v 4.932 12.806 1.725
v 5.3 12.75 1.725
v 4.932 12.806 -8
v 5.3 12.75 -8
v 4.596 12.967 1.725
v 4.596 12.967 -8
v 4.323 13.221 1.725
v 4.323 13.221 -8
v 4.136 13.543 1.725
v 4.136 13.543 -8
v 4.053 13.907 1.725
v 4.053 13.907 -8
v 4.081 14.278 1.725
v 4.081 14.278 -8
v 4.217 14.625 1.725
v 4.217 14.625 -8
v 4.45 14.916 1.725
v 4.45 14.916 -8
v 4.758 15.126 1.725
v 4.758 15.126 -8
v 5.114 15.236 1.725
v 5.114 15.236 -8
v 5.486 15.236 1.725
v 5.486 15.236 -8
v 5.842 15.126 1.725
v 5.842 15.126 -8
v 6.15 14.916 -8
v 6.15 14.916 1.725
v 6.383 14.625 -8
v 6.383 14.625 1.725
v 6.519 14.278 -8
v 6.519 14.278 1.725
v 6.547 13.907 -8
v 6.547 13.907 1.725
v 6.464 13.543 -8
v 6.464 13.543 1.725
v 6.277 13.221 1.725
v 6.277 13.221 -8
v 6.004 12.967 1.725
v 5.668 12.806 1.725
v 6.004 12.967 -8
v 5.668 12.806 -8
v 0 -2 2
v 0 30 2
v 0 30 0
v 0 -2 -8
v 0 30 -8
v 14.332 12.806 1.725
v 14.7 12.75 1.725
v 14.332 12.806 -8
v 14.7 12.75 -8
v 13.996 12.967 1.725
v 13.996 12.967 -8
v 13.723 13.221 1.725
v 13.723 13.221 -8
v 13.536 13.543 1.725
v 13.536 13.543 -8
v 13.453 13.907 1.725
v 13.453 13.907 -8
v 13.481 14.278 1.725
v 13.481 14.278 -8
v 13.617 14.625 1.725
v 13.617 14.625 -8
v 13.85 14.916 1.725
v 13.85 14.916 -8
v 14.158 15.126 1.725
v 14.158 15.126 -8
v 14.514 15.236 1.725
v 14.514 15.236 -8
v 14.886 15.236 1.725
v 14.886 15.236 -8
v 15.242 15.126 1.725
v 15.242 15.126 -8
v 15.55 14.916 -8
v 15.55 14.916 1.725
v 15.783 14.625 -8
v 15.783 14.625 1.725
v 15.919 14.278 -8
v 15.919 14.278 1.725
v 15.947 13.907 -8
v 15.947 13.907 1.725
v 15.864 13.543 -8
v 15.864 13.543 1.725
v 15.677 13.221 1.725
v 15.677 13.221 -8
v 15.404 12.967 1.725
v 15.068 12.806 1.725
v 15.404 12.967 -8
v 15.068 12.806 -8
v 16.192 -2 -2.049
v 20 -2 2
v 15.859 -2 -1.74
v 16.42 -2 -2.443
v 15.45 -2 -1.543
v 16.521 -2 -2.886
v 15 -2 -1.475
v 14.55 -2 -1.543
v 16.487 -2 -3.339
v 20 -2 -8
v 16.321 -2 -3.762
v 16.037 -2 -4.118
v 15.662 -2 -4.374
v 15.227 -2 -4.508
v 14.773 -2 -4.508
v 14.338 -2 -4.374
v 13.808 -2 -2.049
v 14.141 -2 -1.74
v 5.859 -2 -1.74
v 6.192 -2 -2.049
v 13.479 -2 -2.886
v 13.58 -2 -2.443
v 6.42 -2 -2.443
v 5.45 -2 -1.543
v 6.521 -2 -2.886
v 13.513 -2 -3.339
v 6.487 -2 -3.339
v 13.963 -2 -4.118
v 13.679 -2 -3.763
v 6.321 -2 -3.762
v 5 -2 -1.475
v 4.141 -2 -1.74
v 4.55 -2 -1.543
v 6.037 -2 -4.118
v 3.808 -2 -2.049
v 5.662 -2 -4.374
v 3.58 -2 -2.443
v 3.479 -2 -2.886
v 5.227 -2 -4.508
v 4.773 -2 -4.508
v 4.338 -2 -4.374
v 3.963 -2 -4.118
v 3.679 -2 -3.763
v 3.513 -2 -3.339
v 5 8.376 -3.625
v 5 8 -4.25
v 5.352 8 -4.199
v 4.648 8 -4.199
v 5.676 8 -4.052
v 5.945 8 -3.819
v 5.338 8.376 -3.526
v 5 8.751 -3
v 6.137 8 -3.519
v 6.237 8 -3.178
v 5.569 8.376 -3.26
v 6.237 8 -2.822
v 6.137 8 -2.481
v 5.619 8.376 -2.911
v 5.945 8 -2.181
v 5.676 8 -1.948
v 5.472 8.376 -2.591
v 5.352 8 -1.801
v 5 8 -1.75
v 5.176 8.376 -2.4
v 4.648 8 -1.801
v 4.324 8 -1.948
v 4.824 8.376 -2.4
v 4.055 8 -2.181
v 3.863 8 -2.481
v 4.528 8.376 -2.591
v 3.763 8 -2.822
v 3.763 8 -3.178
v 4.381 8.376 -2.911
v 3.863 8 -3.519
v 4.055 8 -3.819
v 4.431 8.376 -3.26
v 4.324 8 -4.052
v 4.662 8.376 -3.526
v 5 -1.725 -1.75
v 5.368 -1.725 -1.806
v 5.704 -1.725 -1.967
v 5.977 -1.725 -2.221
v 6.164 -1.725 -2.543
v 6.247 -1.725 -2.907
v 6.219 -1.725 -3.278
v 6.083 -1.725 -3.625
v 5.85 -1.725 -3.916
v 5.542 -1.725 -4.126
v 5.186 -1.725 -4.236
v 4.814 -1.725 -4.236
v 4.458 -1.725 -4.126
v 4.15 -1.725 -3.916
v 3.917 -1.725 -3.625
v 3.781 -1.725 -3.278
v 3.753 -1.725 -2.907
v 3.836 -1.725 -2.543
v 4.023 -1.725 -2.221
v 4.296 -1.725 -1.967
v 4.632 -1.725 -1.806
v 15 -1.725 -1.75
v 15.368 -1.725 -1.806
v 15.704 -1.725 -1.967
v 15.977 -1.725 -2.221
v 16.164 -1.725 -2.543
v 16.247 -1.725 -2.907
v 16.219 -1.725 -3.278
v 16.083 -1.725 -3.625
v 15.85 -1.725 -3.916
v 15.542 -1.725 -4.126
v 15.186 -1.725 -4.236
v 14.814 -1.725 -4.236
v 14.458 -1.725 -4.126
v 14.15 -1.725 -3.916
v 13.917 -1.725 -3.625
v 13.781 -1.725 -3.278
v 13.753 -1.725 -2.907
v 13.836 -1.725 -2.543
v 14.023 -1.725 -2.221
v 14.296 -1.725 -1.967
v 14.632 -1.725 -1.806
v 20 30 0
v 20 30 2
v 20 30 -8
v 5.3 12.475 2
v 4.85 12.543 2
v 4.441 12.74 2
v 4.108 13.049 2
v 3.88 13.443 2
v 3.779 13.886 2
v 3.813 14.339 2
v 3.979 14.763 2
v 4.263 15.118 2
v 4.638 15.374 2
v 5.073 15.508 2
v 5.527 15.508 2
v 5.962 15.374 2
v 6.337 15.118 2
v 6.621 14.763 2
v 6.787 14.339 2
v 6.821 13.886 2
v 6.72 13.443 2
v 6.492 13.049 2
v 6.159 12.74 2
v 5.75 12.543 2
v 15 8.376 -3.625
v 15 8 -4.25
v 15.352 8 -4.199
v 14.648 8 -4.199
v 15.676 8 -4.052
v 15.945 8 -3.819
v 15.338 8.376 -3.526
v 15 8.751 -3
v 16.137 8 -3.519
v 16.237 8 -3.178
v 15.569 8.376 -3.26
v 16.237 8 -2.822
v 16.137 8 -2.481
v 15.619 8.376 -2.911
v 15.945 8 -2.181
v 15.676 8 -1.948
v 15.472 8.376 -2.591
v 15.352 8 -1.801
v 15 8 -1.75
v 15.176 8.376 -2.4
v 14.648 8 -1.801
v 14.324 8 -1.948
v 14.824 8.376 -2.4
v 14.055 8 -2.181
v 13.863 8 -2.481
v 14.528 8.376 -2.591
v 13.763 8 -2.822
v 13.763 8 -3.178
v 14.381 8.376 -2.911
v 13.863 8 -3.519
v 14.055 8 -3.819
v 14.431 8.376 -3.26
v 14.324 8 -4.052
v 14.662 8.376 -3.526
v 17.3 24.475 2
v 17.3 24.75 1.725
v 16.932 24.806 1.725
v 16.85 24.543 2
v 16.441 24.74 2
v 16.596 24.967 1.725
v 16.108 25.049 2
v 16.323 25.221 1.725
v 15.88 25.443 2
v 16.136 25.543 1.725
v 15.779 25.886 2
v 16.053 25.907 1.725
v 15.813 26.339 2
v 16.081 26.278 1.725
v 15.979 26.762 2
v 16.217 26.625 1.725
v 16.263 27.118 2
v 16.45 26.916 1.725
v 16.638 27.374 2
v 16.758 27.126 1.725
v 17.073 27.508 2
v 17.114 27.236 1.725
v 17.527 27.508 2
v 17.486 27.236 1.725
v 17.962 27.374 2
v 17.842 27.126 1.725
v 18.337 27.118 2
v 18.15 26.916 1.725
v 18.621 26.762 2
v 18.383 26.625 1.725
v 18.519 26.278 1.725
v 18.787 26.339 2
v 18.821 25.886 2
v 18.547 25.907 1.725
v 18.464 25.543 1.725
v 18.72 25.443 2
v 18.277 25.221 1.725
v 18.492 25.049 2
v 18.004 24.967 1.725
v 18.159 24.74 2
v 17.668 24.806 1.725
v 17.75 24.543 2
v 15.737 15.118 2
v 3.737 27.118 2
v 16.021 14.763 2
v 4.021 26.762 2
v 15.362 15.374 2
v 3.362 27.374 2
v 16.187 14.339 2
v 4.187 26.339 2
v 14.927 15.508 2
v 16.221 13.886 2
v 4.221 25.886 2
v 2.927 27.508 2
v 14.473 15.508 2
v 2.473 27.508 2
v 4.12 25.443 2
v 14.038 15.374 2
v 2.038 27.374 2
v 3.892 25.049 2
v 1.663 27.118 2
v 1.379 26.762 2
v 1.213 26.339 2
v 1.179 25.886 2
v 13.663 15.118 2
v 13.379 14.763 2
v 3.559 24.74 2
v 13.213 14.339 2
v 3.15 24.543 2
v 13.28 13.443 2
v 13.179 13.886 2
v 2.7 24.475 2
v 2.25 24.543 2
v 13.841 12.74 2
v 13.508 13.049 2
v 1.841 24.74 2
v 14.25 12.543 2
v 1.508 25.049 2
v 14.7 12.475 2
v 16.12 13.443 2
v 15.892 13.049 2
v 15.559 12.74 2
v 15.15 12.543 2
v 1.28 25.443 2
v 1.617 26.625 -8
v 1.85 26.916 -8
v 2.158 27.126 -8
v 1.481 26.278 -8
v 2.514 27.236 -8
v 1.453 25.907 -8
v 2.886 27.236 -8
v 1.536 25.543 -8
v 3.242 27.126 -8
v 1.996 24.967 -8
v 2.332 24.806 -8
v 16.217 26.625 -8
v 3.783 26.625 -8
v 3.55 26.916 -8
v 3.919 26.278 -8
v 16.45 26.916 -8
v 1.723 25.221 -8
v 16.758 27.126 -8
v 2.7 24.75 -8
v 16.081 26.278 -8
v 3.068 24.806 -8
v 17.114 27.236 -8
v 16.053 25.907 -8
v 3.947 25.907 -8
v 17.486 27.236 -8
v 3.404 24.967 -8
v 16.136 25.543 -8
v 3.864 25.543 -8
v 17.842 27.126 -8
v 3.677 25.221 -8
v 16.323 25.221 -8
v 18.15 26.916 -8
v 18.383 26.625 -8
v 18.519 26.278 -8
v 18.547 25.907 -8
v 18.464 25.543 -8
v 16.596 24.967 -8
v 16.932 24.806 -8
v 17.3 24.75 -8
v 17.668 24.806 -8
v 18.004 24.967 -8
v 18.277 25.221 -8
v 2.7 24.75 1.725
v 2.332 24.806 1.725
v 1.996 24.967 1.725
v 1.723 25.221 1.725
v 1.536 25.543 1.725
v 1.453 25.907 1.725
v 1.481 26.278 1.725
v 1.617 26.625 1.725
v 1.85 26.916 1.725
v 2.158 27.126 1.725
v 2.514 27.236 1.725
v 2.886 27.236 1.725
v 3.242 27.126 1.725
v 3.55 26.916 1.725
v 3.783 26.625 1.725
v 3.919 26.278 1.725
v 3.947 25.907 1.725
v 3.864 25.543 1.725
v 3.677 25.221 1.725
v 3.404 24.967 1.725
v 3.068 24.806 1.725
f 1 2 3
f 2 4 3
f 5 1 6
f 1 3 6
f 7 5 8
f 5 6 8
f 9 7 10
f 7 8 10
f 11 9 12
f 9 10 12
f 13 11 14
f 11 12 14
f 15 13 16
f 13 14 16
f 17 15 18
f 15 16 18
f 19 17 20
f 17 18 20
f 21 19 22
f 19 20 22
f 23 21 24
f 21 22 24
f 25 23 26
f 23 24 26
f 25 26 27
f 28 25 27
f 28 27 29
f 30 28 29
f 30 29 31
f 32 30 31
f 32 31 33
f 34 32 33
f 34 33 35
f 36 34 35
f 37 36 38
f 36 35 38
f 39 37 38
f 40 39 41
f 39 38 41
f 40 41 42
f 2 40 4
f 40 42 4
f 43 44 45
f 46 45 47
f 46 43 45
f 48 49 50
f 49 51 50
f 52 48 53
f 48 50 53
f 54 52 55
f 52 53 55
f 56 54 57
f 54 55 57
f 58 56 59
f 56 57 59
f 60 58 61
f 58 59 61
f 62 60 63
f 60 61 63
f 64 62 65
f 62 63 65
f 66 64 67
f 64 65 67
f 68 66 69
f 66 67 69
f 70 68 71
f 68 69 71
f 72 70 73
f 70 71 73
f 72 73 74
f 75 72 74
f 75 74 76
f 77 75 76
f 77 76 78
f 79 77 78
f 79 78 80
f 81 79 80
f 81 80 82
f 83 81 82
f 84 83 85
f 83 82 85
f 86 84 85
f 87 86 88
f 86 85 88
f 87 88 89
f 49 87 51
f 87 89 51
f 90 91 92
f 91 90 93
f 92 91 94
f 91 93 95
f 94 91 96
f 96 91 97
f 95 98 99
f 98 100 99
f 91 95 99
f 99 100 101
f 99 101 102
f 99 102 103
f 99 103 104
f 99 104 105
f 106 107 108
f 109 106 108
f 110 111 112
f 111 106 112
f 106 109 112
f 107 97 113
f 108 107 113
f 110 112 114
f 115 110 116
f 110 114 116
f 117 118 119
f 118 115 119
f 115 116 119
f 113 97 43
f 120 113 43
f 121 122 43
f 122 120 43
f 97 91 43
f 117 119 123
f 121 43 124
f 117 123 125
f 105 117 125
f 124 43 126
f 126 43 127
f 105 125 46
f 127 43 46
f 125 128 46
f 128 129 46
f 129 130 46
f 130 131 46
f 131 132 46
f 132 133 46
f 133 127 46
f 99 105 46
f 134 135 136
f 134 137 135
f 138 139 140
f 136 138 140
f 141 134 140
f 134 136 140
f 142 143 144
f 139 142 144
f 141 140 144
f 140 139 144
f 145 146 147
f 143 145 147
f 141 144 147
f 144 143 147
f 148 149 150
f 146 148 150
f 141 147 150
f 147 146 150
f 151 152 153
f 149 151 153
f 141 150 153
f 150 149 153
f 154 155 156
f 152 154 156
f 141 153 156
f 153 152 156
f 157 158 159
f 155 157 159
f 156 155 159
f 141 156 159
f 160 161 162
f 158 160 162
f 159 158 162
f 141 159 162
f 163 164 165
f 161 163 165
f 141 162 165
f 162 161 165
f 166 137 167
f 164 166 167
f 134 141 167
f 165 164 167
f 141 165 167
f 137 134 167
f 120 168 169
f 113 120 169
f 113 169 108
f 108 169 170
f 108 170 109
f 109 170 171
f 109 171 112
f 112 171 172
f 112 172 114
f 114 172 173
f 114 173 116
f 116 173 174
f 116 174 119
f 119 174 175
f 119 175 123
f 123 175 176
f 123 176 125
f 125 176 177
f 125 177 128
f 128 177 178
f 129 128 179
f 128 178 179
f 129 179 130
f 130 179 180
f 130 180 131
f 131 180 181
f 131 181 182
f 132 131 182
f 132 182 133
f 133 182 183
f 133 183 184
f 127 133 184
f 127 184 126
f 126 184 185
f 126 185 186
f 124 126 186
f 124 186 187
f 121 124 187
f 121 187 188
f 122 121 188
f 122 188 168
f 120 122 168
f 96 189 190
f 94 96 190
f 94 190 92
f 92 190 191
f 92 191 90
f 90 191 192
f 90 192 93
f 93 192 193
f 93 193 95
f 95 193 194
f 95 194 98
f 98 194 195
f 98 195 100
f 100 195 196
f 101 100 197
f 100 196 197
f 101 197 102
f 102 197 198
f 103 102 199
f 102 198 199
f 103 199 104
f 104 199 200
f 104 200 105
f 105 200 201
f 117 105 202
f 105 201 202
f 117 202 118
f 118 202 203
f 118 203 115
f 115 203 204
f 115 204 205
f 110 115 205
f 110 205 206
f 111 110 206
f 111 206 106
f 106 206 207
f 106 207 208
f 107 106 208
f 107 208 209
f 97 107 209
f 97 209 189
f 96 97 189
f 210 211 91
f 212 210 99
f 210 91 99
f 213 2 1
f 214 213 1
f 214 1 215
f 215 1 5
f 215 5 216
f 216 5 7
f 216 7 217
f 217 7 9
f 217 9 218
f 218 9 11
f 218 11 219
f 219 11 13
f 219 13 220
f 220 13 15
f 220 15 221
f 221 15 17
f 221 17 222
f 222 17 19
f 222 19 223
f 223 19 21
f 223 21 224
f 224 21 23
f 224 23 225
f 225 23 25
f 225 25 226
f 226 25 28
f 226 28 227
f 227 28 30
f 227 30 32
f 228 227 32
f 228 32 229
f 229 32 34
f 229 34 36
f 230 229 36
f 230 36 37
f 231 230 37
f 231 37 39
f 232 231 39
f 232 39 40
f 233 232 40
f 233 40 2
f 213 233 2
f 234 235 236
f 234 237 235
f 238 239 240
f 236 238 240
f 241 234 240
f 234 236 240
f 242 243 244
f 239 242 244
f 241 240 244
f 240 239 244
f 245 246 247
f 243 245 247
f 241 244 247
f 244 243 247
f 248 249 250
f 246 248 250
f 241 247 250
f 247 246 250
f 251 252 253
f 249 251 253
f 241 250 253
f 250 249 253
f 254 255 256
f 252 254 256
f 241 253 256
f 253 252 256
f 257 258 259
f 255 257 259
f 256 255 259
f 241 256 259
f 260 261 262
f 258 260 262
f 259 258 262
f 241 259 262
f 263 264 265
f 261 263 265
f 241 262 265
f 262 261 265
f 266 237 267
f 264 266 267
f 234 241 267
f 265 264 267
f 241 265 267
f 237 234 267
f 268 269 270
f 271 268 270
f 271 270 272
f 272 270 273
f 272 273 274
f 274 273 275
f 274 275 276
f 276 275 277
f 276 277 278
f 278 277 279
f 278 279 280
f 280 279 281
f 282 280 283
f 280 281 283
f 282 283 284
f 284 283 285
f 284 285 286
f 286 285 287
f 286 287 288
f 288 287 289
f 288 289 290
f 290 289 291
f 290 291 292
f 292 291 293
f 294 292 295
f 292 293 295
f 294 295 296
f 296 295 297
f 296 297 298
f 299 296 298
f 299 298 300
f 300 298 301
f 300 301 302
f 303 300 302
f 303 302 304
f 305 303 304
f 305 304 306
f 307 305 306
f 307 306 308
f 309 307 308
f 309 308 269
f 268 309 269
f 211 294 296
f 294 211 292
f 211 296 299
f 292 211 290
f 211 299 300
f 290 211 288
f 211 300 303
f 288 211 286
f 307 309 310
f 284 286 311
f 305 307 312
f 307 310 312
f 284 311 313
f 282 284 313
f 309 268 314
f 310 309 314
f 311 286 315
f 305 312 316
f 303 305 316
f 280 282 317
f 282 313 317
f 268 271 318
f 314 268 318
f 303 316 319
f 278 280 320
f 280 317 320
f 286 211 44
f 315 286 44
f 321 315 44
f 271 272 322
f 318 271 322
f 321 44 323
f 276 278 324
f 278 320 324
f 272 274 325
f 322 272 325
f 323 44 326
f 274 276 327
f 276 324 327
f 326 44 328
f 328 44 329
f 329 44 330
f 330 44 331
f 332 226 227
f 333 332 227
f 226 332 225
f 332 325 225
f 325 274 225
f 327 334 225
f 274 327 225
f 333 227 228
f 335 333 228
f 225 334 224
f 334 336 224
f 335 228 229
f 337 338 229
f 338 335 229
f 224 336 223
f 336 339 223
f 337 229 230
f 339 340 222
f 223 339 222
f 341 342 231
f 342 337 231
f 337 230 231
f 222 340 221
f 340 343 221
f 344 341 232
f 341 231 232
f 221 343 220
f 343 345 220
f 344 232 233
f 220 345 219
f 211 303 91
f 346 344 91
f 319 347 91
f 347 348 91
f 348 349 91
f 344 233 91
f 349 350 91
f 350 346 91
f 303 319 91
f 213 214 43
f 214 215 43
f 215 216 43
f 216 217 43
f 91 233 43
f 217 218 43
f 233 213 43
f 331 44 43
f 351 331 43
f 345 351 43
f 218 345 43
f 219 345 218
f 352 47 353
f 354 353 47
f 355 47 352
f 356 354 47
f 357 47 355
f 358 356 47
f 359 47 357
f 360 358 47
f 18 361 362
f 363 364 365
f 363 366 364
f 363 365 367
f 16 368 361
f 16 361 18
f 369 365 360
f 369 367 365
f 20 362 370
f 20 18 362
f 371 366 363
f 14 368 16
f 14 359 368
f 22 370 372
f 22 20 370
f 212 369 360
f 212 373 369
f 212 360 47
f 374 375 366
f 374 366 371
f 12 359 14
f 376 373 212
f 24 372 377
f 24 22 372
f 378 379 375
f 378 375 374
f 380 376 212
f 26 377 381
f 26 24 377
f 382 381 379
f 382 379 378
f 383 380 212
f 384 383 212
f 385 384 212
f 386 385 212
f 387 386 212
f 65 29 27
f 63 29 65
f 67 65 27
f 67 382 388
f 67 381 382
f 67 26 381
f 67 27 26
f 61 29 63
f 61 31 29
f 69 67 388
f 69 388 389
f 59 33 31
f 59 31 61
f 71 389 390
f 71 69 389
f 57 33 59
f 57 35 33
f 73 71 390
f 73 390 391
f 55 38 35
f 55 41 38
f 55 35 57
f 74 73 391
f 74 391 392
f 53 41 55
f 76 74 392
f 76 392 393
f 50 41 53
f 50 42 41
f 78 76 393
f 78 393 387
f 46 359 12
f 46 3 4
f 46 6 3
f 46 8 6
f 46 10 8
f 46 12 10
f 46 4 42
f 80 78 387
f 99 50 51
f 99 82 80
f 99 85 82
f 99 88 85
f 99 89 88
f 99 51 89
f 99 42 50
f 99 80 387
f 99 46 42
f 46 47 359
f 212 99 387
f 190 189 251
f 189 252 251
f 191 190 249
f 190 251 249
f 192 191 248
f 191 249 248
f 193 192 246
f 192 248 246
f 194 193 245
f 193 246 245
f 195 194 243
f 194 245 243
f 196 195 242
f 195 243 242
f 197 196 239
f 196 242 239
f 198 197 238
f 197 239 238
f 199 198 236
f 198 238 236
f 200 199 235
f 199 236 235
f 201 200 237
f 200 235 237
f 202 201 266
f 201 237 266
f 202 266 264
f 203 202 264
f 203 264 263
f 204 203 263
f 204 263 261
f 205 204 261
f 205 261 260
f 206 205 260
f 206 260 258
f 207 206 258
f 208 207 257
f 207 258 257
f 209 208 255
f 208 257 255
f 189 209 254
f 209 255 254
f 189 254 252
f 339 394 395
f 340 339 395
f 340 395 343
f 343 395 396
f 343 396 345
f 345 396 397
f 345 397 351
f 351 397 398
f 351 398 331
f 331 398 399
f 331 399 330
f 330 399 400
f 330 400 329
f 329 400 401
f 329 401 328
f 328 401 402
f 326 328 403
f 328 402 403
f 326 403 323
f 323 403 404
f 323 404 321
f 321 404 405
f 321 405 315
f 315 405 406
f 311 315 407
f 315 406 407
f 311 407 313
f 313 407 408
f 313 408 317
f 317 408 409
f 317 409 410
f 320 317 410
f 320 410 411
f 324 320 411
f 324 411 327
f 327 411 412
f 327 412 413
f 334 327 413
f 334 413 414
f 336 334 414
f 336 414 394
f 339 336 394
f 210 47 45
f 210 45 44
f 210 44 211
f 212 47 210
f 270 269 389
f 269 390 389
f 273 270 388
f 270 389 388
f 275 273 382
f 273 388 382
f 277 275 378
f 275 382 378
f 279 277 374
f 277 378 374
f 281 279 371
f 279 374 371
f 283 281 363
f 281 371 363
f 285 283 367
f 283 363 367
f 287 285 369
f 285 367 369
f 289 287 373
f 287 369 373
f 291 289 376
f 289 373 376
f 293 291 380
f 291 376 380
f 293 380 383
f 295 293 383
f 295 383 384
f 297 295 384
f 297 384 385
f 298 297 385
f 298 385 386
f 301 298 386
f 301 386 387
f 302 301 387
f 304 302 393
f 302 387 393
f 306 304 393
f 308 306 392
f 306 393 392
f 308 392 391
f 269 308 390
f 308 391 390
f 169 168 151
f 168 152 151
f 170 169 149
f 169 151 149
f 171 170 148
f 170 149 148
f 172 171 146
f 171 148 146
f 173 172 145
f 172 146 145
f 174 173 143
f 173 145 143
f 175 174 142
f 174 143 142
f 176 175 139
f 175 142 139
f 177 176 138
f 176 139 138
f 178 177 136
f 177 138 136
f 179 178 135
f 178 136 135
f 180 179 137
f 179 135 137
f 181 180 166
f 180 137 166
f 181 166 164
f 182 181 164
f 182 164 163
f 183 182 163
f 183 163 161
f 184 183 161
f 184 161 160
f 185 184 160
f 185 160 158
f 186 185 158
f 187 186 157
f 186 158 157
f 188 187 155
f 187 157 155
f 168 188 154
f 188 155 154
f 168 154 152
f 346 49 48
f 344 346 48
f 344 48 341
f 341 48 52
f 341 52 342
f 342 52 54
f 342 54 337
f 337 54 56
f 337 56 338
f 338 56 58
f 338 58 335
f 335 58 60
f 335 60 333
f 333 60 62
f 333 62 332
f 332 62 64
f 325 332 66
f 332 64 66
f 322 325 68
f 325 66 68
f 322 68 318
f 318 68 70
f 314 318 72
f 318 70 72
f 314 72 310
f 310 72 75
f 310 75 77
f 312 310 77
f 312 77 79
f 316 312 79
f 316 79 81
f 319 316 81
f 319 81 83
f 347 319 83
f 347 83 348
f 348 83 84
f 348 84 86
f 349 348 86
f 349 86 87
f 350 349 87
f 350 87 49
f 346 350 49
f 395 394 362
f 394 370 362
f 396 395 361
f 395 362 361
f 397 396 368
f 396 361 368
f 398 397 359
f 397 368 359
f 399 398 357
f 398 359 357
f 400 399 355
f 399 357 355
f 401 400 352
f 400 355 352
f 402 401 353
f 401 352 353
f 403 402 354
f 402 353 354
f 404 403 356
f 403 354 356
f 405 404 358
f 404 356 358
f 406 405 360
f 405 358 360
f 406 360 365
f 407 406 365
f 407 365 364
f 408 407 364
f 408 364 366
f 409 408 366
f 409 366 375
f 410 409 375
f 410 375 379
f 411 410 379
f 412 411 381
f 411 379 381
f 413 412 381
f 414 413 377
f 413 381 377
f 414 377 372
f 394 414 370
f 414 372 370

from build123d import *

# Parameters (mm, degrees)
EXTRUDE_1_DEPTH              = 20
HOLE_WIZARD_M3_1_D           = 2.5
HOLE_WIZARD_M3_1_DEPTH       = 10
HOLE_WIZARD_M3_1_CSINK_D     = 3.05
HOLE_WIZARD_M3_1_CSINK_ANGLE = 90
HOLE_WIZARD_M3_1_TIP         = 0.751075774
HOLE_WIZARD_M3_2_D           = 2.5
HOLE_WIZARD_M3_2_CSINK_D     = 3.05
HOLE_WIZARD_M3_2_CSINK_ANGLE = 90
HOLE_WIZARD_M3_4_D           = 2.5
HOLE_WIZARD_M3_4_CSINK_D     = 3.05
HOLE_WIZARD_M3_4_CSINK_ANGLE = 90
SKETCH_9_W                   = 20
SKETCH_9_H                   = 3.237584756
EXTRUDE_2_DEPTH              = 2
SKETCH_12_W                  = 20
SKETCH_12_H                  = 11.028073375
CUT_EXTRUDE_1_DEPTH          = 39.223029707
SKETCH_13_W                  = 20
SKETCH_13_H                  = 8
EXTRUDE_3_DEPTH              = 2


with BuildPart() as part:
    # 草图1 → 凸台-拉伸1 (new body)
    with BuildSketch(Plane(origin=(0, 0, 0), x_dir=(0, 0, -1), z_dir=(1, 0, 0))):
        Polygon((0, 28), (-2, 28), (-2, -2), (8, -2), (8, 0), (8, 28), align=None)
    extrude(amount=EXTRUDE_1_DEPTH)

    # M3 螺纹孔1
    with Locations(Plane(origin=(5, -2, -3), x_dir=(0, 0, -1), z_dir=(0, -1, 0))):
        with Locations((0, 0), (0, 10)):
            CounterSinkHole(HOLE_WIZARD_M3_1_D / 2, HOLE_WIZARD_M3_1_CSINK_D / 2, depth=HOLE_WIZARD_M3_1_DEPTH, counter_sink_angle=HOLE_WIZARD_M3_1_CSINK_ANGLE)
            with Locations((0, 0, -(HOLE_WIZARD_M3_1_DEPTH + HOLE_WIZARD_M3_1_TIP / 2))):  # 118° drill point
                Cone(0, HOLE_WIZARD_M3_1_D / 2, HOLE_WIZARD_M3_1_TIP, mode=Mode.SUBTRACT)

    # M3 螺纹孔2 (through all)
    with Locations(Plane(origin=(14.7, 14, 2), x_dir=(0, 1, 0), z_dir=(0, 0, 1))):
        with Locations((0, 0), (12, 12)):
            CounterSinkHole(HOLE_WIZARD_M3_2_D / 2, HOLE_WIZARD_M3_2_CSINK_D / 2, counter_sink_angle=HOLE_WIZARD_M3_2_CSINK_ANGLE)

    # M3 螺纹孔4 (through all)
    with Locations(Plane(origin=(5.3, 14, 2), x_dir=(0, 1, 0), z_dir=(0, 0, 1))):
        with Locations((0, 0), (12, -12)):
            CounterSinkHole(HOLE_WIZARD_M3_4_D / 2, HOLE_WIZARD_M3_4_CSINK_D / 2, counter_sink_angle=HOLE_WIZARD_M3_4_CSINK_ANGLE)

    # 草图9 → 凸台-拉伸2 (add)
    with BuildSketch(Plane.XY.offset(2)):
        with Locations((10, 29.381207622)):
            Rectangle(SKETCH_9_W, SKETCH_9_H)
    extrude(amount=-EXTRUDE_2_DEPTH)

    # 草图12 → 切除-拉伸1 (cut, through all)
    with BuildSketch(Plane.XY.offset(2)):
        with Locations((10, 35.514036688)):
            Rectangle(SKETCH_12_W, SKETCH_12_H)
    extrude(amount=-CUT_EXTRUDE_1_DEPTH, mode=Mode.SUBTRACT)

    # 草图13 → 凸台-拉伸3 (add)
    with BuildSketch(Plane(origin=(0, 28, 0), x_dir=(1, 0, 0), z_dir=(0, 1, 0))):
        with Locations((10, 4)):
            Rectangle(SKETCH_13_W, SKETCH_13_H)
    extrude(amount=EXTRUDE_3_DEPTH)


solid = part.part
